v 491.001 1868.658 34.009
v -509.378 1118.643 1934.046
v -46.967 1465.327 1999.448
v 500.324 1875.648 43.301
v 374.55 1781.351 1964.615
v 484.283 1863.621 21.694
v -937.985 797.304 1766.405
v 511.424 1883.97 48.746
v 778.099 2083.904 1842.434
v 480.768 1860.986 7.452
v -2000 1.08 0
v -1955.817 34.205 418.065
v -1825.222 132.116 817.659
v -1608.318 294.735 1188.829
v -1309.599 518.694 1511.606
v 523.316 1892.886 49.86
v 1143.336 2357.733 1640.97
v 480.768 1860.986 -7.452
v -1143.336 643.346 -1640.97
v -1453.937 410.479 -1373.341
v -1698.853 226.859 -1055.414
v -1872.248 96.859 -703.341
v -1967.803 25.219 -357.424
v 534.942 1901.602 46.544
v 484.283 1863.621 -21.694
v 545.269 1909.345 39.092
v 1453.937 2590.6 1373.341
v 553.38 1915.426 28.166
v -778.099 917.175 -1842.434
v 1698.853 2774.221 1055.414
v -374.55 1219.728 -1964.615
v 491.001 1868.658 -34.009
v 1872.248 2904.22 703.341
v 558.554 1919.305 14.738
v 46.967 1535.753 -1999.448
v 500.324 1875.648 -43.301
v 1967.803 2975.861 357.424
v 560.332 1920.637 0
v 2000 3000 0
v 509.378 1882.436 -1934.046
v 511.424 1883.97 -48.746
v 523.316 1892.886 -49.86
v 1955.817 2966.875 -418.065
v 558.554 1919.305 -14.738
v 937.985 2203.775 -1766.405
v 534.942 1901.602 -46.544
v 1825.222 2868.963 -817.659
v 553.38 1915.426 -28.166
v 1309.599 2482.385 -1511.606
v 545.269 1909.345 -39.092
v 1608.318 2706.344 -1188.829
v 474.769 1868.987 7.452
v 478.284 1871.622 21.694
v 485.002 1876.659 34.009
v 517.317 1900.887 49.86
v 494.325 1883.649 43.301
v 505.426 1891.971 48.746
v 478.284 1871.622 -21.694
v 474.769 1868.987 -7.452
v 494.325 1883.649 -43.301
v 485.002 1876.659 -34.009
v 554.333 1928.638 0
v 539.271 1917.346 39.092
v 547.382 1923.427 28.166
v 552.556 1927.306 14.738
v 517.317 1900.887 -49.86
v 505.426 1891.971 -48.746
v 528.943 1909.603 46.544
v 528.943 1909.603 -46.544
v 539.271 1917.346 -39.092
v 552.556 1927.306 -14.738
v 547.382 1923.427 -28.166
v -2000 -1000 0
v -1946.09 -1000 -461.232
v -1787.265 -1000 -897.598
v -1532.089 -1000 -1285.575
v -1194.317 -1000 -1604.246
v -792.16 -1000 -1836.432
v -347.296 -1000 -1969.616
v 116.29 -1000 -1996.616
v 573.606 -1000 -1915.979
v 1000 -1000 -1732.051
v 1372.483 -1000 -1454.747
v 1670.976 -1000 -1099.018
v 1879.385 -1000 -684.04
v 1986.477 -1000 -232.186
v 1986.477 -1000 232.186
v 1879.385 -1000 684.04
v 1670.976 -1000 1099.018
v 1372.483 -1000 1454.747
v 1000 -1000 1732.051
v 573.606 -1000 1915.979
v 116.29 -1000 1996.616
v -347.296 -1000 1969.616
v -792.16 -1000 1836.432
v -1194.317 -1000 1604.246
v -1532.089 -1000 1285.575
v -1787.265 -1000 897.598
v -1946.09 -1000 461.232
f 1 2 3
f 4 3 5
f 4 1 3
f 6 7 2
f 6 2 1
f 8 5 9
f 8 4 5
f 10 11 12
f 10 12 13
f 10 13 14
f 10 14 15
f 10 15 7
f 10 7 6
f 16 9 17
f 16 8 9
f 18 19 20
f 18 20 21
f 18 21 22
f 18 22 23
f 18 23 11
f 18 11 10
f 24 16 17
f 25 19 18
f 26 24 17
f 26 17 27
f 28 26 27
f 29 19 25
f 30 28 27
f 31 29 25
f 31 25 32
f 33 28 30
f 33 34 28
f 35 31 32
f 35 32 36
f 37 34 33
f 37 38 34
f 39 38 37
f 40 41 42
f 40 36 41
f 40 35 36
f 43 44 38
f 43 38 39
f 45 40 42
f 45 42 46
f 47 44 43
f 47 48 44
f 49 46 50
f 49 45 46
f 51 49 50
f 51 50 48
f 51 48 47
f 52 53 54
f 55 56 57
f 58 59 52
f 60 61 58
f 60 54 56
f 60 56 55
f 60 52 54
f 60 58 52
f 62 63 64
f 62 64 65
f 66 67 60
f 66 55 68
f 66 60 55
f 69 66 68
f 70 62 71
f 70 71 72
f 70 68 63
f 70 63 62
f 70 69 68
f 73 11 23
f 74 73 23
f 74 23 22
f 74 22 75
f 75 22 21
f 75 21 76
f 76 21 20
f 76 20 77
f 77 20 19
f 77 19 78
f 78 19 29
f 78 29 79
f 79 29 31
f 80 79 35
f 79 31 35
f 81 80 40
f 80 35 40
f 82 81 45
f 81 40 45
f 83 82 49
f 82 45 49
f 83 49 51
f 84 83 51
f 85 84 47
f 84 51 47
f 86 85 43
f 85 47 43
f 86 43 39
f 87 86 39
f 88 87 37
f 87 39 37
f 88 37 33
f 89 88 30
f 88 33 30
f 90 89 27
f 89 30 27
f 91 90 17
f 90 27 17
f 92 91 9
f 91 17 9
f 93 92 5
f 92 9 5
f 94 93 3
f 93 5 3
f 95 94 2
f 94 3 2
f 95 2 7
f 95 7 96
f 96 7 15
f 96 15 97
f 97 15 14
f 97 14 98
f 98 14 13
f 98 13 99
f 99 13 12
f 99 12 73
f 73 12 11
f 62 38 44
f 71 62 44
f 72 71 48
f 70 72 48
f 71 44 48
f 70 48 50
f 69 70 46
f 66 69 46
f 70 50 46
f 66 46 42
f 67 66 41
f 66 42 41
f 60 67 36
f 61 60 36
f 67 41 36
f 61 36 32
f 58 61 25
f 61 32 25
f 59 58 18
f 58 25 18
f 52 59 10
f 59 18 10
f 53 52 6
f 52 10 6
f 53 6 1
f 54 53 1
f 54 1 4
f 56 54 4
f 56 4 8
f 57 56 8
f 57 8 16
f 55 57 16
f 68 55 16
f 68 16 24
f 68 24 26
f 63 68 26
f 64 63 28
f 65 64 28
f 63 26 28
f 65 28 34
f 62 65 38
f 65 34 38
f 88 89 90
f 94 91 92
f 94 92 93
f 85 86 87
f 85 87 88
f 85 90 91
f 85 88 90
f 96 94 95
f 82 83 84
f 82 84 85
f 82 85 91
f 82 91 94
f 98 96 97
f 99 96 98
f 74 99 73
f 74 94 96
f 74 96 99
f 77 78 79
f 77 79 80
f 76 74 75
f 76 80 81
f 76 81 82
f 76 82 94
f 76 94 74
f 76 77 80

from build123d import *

# Parameters (mm, degrees)
SKETCH1_W               = 2000
SKETCH1_H               = 4000
CUT_EXTRUDE1_DEPTH      = 4124.105625618
CUT_EXTRUDE1_DEPTH_BACK = 4124.105625618
SKETCH3_R               = 50
BOSS_EXTRUDE1_DEPTH     = 10


with BuildPart() as part:
    # Sketch1 → Revolve1 (revolve)
    with BuildSketch(Plane.XY):
        with Locations((-1000, 1000)):
            Rectangle(SKETCH1_W, SKETCH1_H)
    revolve(axis=Axis((0, 3000, 0), (0, -1, 0)))

    # Sketch2 → Cut-Extrude1 (cut, two sides: drawn at the far end of the back side and taken through both)
    with BuildSketch(Plane.XY.offset(-CUT_EXTRUDE1_DEPTH_BACK)):
        Polygon((2000, 3000), (-2000, 3000), (-2000, 1.079525824), align=None)
    extrude(amount=CUT_EXTRUDE1_DEPTH + CUT_EXTRUDE1_DEPTH_BACK, mode=Mode.SUBTRACT)

    # Sketch3 → Boss-Extrude1 (add)
    with BuildSketch(Plane(origin=(-720.186463571, 960.594280205, 0), x_dir=(0.8001036359678502, 0.5998617938417364, 0), z_dir=(-0.5998617938417364, 0.8001036359678502, 0))):
        with Locations((1550.440294361, 0)):
            Circle(SKETCH3_R)
    extrude(amount=BOSS_EXTRUDE1_DEPTH)


solid = part.part
